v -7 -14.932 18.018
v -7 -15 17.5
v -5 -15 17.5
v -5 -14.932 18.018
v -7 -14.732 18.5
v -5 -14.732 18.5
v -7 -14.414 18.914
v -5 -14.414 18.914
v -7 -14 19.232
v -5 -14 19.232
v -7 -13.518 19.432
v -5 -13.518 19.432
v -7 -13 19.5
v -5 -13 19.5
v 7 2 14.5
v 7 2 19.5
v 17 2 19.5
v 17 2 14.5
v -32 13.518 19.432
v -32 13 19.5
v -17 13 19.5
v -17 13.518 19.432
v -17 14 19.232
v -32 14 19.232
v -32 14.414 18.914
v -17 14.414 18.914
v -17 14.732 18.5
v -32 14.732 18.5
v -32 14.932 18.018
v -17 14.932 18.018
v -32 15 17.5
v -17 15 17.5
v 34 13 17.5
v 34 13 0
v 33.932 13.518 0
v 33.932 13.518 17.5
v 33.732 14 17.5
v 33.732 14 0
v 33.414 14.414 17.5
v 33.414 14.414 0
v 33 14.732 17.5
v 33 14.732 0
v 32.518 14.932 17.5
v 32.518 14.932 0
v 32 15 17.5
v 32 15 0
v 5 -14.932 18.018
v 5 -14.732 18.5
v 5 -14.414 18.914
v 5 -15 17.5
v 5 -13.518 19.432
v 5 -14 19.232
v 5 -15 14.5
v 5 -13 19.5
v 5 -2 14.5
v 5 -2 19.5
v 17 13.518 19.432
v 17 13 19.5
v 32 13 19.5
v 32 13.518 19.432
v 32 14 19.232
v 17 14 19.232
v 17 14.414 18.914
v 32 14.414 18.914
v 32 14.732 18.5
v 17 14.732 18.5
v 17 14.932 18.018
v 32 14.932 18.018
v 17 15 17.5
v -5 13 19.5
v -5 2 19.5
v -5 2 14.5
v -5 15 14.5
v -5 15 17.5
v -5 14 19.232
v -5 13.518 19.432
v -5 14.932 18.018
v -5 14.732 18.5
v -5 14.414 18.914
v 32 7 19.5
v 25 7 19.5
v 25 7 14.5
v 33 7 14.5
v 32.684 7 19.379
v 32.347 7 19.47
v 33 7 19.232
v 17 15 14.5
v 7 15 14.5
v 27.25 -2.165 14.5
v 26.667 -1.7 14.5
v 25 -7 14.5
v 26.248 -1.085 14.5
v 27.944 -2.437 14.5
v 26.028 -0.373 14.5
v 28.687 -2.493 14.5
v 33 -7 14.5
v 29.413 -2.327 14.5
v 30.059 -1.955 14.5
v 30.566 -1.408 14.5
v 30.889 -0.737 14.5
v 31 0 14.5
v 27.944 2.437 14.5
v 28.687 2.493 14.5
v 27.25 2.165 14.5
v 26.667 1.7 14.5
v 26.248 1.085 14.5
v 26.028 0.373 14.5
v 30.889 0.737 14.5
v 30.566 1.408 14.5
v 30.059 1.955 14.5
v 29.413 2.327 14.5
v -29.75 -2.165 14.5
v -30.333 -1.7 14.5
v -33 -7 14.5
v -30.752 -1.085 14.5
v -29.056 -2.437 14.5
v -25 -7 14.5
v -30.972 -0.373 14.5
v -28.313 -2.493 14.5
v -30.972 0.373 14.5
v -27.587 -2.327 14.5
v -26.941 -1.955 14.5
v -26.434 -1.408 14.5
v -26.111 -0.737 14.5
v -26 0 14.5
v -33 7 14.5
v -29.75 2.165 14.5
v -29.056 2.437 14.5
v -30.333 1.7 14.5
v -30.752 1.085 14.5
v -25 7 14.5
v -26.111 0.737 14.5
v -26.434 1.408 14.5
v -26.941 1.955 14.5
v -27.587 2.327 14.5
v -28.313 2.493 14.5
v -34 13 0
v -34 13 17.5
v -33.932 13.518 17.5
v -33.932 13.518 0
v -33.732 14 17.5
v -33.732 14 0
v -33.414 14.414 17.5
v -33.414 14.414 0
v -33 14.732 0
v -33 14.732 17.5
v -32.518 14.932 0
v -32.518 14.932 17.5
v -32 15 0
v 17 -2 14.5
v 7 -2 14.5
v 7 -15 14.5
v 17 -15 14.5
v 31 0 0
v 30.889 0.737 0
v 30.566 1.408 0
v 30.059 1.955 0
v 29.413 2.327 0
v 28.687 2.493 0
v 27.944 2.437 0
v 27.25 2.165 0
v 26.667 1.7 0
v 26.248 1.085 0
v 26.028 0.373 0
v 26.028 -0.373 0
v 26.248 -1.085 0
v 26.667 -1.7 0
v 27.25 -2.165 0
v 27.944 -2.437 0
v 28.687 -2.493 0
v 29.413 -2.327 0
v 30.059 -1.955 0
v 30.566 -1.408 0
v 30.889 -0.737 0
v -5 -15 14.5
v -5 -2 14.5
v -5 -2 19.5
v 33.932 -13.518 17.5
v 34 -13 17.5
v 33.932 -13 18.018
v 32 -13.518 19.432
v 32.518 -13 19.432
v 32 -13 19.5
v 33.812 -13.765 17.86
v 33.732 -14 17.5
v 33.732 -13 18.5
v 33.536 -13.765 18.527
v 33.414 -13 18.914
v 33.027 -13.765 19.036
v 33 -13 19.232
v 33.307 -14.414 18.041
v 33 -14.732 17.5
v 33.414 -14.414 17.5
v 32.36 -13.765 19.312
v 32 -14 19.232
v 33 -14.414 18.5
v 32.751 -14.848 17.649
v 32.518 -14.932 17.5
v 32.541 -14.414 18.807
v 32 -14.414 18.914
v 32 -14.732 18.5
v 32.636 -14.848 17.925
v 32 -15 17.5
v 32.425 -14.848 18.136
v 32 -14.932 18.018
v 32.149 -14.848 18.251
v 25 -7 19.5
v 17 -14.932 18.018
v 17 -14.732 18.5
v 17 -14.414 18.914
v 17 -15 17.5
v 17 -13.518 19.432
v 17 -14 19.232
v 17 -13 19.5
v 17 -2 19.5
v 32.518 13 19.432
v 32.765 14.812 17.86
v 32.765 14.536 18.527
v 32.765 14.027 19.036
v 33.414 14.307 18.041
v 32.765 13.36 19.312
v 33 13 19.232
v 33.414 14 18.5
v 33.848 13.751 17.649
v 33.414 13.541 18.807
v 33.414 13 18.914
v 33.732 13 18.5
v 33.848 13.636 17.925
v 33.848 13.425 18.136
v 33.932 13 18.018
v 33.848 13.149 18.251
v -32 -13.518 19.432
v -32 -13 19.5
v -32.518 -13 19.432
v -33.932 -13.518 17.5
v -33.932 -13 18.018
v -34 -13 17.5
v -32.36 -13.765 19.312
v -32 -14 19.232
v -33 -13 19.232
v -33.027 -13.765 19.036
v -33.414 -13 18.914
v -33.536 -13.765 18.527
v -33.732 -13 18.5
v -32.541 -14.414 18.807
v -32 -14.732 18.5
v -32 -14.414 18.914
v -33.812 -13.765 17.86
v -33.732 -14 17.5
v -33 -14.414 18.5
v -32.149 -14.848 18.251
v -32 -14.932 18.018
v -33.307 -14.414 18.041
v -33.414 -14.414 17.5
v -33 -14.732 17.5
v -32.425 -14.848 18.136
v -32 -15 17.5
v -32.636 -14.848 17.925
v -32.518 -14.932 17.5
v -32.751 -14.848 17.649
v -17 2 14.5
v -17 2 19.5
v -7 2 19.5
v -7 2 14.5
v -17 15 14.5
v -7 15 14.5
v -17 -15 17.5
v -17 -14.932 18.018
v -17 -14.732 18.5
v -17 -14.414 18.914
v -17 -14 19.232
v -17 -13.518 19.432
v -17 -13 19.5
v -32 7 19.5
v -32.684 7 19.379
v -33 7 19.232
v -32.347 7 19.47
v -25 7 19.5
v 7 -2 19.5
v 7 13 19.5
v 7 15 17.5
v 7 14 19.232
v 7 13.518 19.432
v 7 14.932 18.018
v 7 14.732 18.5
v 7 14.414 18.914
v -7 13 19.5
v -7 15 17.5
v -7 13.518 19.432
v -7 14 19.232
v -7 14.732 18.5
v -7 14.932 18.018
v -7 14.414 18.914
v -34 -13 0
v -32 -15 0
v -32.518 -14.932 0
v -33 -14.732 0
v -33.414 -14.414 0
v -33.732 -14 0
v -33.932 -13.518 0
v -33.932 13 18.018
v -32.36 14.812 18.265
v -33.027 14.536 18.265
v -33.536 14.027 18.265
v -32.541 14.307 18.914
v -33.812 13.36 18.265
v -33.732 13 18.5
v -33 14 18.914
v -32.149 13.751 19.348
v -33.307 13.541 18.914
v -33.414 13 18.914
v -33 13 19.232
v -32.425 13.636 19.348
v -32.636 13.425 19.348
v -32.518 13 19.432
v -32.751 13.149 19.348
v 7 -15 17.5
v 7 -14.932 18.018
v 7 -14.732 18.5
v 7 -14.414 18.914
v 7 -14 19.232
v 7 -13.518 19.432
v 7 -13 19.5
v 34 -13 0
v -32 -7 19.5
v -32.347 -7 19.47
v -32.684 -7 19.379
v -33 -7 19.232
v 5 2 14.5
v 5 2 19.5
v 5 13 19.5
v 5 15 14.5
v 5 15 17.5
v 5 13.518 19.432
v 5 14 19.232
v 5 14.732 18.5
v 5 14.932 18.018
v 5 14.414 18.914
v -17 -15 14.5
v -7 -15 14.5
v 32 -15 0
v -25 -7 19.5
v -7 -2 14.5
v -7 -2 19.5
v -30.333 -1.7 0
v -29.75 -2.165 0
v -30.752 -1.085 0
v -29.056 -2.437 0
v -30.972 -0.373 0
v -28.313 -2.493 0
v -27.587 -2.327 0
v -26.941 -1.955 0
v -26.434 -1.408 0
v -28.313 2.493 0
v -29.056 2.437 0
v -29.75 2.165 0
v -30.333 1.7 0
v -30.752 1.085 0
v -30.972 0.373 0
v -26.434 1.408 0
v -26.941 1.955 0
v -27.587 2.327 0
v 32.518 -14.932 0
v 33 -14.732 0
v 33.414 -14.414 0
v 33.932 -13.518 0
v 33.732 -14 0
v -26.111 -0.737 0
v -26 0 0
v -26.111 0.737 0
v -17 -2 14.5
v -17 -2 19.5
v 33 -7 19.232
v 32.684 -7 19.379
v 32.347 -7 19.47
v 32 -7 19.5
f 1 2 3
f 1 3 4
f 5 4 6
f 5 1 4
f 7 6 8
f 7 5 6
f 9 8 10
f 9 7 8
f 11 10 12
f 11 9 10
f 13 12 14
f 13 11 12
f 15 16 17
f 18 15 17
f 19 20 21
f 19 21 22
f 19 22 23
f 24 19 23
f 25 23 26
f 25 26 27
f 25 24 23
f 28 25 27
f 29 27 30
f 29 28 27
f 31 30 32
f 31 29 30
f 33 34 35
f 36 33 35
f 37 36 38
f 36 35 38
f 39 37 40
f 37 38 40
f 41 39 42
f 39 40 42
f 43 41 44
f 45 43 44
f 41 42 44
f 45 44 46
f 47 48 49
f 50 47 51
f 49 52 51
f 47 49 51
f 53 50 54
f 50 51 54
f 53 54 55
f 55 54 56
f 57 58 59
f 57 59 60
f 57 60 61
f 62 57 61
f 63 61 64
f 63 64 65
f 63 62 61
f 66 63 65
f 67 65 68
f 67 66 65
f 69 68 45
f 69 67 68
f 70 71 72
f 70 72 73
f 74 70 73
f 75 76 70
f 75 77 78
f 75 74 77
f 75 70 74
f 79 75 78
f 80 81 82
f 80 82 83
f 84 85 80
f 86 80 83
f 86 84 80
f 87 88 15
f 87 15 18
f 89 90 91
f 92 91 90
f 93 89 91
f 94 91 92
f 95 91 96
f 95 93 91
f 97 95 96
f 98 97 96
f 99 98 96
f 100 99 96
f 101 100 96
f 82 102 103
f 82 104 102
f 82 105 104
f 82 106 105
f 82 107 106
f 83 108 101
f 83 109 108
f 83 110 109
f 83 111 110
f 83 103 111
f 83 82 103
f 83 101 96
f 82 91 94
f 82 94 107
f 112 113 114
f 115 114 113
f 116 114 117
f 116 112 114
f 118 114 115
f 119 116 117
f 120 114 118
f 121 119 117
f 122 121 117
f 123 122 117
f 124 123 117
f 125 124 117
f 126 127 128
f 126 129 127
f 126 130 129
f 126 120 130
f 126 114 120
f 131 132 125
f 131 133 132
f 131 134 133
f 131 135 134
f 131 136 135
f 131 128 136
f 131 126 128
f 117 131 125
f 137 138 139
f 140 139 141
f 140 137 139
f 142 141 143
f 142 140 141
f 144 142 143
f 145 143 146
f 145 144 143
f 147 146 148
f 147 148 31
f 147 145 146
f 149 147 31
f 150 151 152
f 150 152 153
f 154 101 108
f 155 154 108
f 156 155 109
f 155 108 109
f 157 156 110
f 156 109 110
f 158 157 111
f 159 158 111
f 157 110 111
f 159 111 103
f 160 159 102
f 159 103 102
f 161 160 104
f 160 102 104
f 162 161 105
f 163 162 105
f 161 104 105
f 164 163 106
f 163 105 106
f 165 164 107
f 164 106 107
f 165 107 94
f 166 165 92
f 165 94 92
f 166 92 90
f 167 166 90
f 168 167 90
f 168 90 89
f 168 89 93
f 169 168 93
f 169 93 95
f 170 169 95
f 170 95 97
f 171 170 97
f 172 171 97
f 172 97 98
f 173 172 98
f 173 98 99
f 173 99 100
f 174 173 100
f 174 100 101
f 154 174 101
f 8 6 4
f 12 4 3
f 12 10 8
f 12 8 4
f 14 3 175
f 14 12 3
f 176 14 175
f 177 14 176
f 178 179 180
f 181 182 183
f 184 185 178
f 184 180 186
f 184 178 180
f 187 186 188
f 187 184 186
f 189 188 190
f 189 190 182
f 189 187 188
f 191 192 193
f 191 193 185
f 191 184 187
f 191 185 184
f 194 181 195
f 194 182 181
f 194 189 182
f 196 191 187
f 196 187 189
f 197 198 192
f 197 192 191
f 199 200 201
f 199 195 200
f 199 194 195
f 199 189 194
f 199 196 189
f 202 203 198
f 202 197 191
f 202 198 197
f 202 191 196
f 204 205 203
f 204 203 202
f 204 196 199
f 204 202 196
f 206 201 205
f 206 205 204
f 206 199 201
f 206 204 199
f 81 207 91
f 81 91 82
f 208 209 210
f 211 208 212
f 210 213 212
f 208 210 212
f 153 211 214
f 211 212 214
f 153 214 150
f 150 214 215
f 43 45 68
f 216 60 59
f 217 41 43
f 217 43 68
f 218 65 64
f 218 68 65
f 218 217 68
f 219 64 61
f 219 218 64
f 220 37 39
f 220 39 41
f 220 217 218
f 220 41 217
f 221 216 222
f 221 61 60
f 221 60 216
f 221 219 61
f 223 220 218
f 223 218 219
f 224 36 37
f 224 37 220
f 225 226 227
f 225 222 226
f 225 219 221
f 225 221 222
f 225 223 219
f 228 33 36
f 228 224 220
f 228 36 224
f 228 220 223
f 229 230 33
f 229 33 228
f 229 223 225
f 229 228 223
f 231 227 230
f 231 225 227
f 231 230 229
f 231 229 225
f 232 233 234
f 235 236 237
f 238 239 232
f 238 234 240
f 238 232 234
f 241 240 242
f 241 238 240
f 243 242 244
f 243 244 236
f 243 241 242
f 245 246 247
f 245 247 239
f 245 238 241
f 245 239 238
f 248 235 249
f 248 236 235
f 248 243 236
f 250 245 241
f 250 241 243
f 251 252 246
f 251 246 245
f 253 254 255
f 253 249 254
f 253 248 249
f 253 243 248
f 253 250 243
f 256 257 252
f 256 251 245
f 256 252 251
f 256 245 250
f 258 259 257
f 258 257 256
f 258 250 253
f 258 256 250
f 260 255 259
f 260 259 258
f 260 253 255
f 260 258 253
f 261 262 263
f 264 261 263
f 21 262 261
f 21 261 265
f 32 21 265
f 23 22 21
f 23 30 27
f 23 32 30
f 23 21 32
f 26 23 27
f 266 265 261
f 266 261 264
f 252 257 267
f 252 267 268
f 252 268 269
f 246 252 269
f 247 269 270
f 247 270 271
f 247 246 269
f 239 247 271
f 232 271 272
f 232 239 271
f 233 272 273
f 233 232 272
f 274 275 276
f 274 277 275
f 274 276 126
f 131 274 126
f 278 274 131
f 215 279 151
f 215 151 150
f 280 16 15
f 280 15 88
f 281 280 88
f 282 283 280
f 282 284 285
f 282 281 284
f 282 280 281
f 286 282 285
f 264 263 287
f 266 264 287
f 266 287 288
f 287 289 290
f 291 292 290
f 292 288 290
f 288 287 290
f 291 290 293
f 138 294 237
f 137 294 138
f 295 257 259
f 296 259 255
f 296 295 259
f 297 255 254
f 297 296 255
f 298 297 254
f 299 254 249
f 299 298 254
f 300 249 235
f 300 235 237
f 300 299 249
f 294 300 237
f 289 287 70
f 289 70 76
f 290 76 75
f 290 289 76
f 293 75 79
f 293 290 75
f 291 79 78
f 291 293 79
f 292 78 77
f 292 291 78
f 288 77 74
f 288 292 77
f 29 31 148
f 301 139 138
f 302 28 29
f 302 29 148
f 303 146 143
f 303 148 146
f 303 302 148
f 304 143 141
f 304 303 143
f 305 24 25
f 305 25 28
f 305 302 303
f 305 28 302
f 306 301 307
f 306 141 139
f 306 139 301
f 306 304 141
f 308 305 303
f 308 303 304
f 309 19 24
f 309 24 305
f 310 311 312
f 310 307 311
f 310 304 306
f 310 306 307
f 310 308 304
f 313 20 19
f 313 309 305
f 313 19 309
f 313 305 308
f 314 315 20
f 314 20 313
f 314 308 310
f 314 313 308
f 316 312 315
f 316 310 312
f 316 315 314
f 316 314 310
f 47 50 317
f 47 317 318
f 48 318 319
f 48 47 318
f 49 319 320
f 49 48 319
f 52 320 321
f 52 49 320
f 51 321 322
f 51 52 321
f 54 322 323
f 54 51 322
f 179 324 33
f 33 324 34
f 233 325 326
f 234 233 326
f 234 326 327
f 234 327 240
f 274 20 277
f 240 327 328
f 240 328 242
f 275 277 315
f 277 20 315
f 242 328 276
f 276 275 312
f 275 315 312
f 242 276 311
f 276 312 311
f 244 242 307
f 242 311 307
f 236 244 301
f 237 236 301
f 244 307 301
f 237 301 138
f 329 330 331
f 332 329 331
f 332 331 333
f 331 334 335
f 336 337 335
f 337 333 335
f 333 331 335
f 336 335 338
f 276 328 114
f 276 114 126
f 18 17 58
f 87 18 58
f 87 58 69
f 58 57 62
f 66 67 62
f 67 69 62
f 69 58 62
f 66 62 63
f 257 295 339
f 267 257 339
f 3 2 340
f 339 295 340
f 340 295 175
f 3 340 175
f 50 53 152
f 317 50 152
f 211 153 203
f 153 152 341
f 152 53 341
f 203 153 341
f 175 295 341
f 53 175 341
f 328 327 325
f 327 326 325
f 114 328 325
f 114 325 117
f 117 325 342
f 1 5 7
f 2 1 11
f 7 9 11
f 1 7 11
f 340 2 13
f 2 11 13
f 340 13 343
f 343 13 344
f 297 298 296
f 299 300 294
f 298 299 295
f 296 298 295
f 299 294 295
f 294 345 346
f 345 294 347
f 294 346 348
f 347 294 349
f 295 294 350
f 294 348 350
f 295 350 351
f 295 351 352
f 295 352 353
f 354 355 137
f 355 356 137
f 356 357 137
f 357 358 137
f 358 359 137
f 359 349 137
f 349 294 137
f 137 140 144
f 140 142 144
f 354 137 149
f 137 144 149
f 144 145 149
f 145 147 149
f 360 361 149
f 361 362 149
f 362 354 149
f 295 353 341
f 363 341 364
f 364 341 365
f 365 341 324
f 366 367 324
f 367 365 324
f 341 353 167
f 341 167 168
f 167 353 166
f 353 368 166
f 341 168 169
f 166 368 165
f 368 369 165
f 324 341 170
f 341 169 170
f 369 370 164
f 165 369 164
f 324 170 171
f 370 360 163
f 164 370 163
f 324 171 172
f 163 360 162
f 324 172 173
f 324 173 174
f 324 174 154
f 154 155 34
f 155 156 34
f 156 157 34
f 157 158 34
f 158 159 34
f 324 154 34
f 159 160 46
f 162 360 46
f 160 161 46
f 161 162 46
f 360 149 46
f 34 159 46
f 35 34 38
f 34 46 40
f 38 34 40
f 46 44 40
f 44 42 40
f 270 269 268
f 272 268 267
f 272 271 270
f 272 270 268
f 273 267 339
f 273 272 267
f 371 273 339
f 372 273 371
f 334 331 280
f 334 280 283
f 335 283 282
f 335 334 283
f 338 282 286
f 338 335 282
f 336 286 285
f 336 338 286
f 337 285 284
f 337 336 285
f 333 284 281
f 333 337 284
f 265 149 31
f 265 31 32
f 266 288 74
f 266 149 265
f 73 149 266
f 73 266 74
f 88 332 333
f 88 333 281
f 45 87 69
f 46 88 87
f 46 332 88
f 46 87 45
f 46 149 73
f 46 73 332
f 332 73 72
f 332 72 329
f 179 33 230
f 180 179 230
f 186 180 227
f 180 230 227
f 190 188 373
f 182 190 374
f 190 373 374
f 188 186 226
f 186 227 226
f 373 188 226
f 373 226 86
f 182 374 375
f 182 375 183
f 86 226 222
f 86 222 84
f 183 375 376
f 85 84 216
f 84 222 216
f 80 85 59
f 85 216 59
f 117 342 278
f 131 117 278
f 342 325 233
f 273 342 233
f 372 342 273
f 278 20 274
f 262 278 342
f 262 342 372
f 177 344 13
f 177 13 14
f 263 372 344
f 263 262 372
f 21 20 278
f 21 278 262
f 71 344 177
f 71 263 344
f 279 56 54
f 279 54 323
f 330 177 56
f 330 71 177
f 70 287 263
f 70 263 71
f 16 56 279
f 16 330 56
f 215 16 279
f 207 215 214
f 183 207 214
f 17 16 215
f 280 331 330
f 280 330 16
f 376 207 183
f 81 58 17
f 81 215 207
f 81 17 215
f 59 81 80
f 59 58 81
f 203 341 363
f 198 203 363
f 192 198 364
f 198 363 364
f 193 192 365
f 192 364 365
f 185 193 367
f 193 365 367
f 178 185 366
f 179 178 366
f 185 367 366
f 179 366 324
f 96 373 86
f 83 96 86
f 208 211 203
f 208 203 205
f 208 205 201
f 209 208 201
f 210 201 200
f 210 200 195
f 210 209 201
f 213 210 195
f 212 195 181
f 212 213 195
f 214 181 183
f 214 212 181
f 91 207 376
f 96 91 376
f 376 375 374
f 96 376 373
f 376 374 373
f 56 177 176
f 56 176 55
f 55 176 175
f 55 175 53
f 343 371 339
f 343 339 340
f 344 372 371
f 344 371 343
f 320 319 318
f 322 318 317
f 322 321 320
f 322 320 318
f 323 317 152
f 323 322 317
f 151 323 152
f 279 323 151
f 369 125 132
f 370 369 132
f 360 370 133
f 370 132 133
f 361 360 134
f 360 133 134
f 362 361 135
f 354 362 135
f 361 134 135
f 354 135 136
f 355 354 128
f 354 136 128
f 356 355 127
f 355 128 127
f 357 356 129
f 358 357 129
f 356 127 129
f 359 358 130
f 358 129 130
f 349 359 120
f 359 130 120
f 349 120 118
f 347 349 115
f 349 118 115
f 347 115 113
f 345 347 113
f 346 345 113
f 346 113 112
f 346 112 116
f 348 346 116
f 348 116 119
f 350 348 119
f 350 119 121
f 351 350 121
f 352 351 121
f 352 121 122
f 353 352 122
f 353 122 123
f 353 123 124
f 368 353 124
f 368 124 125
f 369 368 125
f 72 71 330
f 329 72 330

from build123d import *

# Parameters (mm, degrees)
F0_W         = 68
F0_H         = 30
F1_DEPTH     = 19.5
F2_R         = 2.5
F3_DEPTH     = 19.5
F4_W         = 10
F4_H         = 13
F4_W_2       = 8
F4_H_2       = 14
F5_DEPTH     = 5
F6_T1_DEPTH  = 20
F6_T3_DEPTH  = 26
F6_T5_DEPTH  = 20
F6_T7_DEPTH  = 12
F6_T9_DEPTH  = 12
F6_T11_DEPTH = 22.5
F6_S15_W     = 2
F6_S15_H     = 2
F6_T16_DEPTH = 2
F6_S21_W     = 2
F6_S21_H     = 2
F6_T22_DEPTH = 2
F6_S27_W     = 2
F6_S27_H     = 2
F6_T28_DEPTH = 2
F6_S33_W     = 2
F6_S33_H     = 2
F6_T34_DEPTH = 2


# Not quite as in the source:
# - a fillet or chamfer that OpenCascade refuses, or shapes differently, is made with other operations: its cross-section is extruded or revolved along the edge and cut away or added


with BuildPart() as f1:
    # F0 (on Top) → F1 (new body)
    with BuildSketch(Plane.XY):
        Rectangle(F0_W, F0_H)
    extrude(amount=F1_DEPTH)

    # F2 (on face) → F3 (cut, through all)
    with BuildSketch(Plane.XY.offset(19.5)):
        with Locations((-28.5, 0)):
            Circle(F2_R)
        with Locations((28.5, 0)):
            Circle(F2_R)
    extrude(amount=-F3_DEPTH, mode=Mode.SUBTRACT)

    # F4 (on face) → F5 (cut)
    with BuildSketch(Plane.XY.offset(19.5)):
        with Locations((0, 8.5)):
            Rectangle(F4_W, F4_H)
        with Locations((12, 8.5)):
            Rectangle(F4_W, F4_H)
        with Locations((-12, 8.5)):
            Rectangle(F4_W, F4_H)
        with Locations((-12, -8.5)):
            Rectangle(F4_W, F4_H)
        with Locations((0, -8.5)):
            Rectangle(F4_W, F4_H)
        with Locations((12, -8.5)):
            Rectangle(F4_W, F4_H)
        with Locations((29, 0)):
            Rectangle(F4_W_2, F4_H_2)
        with Locations((-29, 0)):
            Rectangle(F4_W_2, F4_H_2)
    extrude(amount=-F5_DEPTH, mode=Mode.SUBTRACT)

    # F6: fillet of radius 2 on 14 edges, made by hand

    # F6_s2 → F6_t1 (cut)
    with BuildSketch(Plane.YZ.offset(-32)):
        with BuildLine():
            ThreePointArc((-15, 17.5), (-14.4142135624, 18.9142135624), (-13, 19.5))
            Line((-13, 19.5), (-15, 19.5))
            Line((-15, 19.5), (-15, 17.5))
        make_face()
        with BuildLine():
            ThreePointArc((13, 19.5), (14.4142135624, 18.9142135624), (15, 17.5))
            Line((15, 17.5), (15, 19.5))
            Line((15, 19.5), (13, 19.5))
        make_face()
    extrude(amount=F6_T1_DEPTH, mode=Mode.SUBTRACT)

    # F6_s4 → F6_t3 (cut)
    with BuildSketch(Plane.XZ.offset(-13)):
        with BuildLine():
            ThreePointArc((-32, 19.5), (-33.4142135624, 18.9142135624), (-34, 17.5))
            Line((-34, 17.5), (-34, 19.5))
            Line((-34, 19.5), (-32, 19.5))
        make_face()
        with BuildLine():
            ThreePointArc((34, 17.5), (33.4142135624, 18.9142135624), (32, 19.5))
            Line((32, 19.5), (34, 19.5))
            Line((34, 19.5), (34, 17.5))
        make_face()
    extrude(amount=F6_T3_DEPTH, mode=Mode.SUBTRACT)

    # F6_s6 → F6_t5 (cut)
    with BuildSketch(Plane.YZ.offset(12)):
        with BuildLine():
            ThreePointArc((-15, 17.5), (-14.4142135624, 18.9142135624), (-13, 19.5))
            Line((-13, 19.5), (-15, 19.5))
            Line((-15, 19.5), (-15, 17.5))
        make_face()
        with BuildLine():
            ThreePointArc((13, 19.5), (14.4142135624, 18.9142135624), (15, 17.5))
            Line((15, 17.5), (15, 19.5))
            Line((15, 19.5), (13, 19.5))
        make_face()
    extrude(amount=F6_T5_DEPTH, mode=Mode.SUBTRACT)

    # F6_s8 → F6_t7 (cut)
    with BuildSketch(Plane.YZ):
        with BuildLine():
            ThreePointArc((-15, 17.5), (-14.4142135624, 18.9142135624), (-13, 19.5))
            Line((-13, 19.5), (-15, 19.5))
            Line((-15, 19.5), (-15, 17.5))
        make_face()
        with BuildLine():
            ThreePointArc((13, 19.5), (14.4142135624, 18.9142135624), (15, 17.5))
            Line((15, 17.5), (15, 19.5))
            Line((15, 19.5), (13, 19.5))
        make_face()
    extrude(amount=F6_T7_DEPTH, mode=Mode.SUBTRACT)

    # F6_s10 → F6_t9 (cut)
    with BuildSketch(Plane.YZ.offset(-12)):
        with BuildLine():
            ThreePointArc((-15, 17.5), (-14.4142135624, 18.9142135624), (-13, 19.5))
            Line((-13, 19.5), (-15, 19.5))
            Line((-15, 19.5), (-15, 17.5))
        make_face()
        with BuildLine():
            ThreePointArc((13, 19.5), (14.4142135624, 18.9142135624), (15, 17.5))
            Line((15, 17.5), (15, 19.5))
            Line((15, 19.5), (13, 19.5))
        make_face()
    extrude(amount=F6_T9_DEPTH, mode=Mode.SUBTRACT)

    # F6_s12 → F6_t11 (cut)
    with BuildSketch(Plane.XY.offset(-5)):
        with BuildLine():
            ThreePointArc((-32, -15), (-33.4142135624, -14.4142135624), (-34, -13))
            Line((-34, -13), (-34, -15))
            Line((-34, -15), (-32, -15))
        make_face()
        with BuildLine():
            ThreePointArc((-34, 13), (-33.4142135624, 14.4142135624), (-32, 15))
            Line((-32, 15), (-34, 15))
            Line((-34, 15), (-34, 13))
        make_face()
        with BuildLine():
            ThreePointArc((34, 13), (33.4142135624, 14.4142135624), (32, 15))
            Line((32, 15), (34, 15))
            Line((34, 15), (34, 13))
        make_face()
        with BuildLine():
            ThreePointArc((32, -15), (33.4142135624, -14.4142135624), (34, -13))
            Line((34, -13), (34, -15))
            Line((34, -15), (32, -15))
        make_face()
    extrude(amount=F6_T11_DEPTH, mode=Mode.SUBTRACT)


with BuildPart() as f6_tool14:
    # F6_s15 → F6_t16 (new body)
    with BuildSketch(Plane.XZ.offset(13)):
        with Locations((-33, 18.5)):
            Rectangle(F6_S15_W, F6_S15_H)
    extrude(amount=F6_T16_DEPTH)

    # F6_s17 → F6_t18 (revolve, cut)
    with BuildSketch(Plane(origin=(-32, -13, 17.5), x_dir=(0.7071067812, 0, -0.7071067812), z_dir=(-0.7071067812, 0, -0.7071067812))):
        with BuildLine():
            ThreePointArc((0, -2), (2, 0), (0, 2))
            Line((0, 2), (0, -2))
        make_face()
    revolve(axis=Axis((-32, -13, 17.5), (0, -1, 0)), mode=Mode.SUBTRACT)


with BuildPart() as f1_1:
    add(f1.part)

    # F6_t13: cut F6_tool14
    add(f6_tool14.part, mode=Mode.SUBTRACT)


with BuildPart() as f6_tool20:
    # F6_s21 → F6_t22 (new body)
    with BuildSketch(Plane.XY.offset(17.5)):
        with Locations((-33, 14)):
            Rectangle(F6_S21_W, F6_S21_H)
    extrude(amount=F6_T22_DEPTH)

    # F6_s23 → F6_t24 (revolve, cut)
    with BuildSketch(Plane(origin=(-32, 13, 17.5), x_dir=(0.7071067812, -0.7071067812, 0), z_dir=(-0.7071067812, -0.7071067812, 0))):
        with BuildLine():
            ThreePointArc((0, -2), (2, 0), (0, 2))
            Line((0, 2), (0, -2))
        make_face()
    revolve(axis=Axis((-32, 13, 17.5), (0, 0, 1)), mode=Mode.SUBTRACT)


with BuildPart() as f1_2:
    add(f1_1.part)

    # F6_t19: cut F6_tool20
    add(f6_tool20.part, mode=Mode.SUBTRACT)


with BuildPart() as f6_tool26:
    # F6_s27 → F6_t28 (new body)
    with BuildSketch(Plane.XZ.offset(13)):
        with Locations((33, 18.5)):
            Rectangle(F6_S27_W, F6_S27_H)
    extrude(amount=F6_T28_DEPTH)

    # F6_s29 → F6_t30 (revolve, cut)
    with BuildSketch(Plane(origin=(32, -13, 17.5), x_dir=(-0.7071067812, 0, -0.7071067812), z_dir=(-0.7071067812, 0, 0.7071067812))):
        with BuildLine():
            ThreePointArc((0, -2), (2, 0), (0, 2))
            Line((0, 2), (0, -2))
        make_face()
    revolve(axis=Axis((32, -13, 17.5), (0, -1, 0)), mode=Mode.SUBTRACT)


with BuildPart() as f1_3:
    add(f1_2.part)

    # F6_t25: cut F6_tool26
    add(f6_tool26.part, mode=Mode.SUBTRACT)


with BuildPart() as f6_tool32:
    # F6_s33 → F6_t34 (new body)
    with BuildSketch(Plane.YZ.offset(32)):
        with Locations((14, 18.5)):
            Rectangle(F6_S33_W, F6_S33_H)
    extrude(amount=F6_T34_DEPTH)

    # F6_s35 → F6_t36 (revolve, cut)
    with BuildSketch(Plane(origin=(32, 13, 17.5), x_dir=(0, -0.7071067812, -0.7071067812), z_dir=(0, -0.7071067812, 0.7071067812))):
        with BuildLine():
            ThreePointArc((0, -2), (2, 0), (0, 2))
            Line((0, 2), (0, -2))
        make_face()
    revolve(axis=Axis((32, 13, 17.5), (1, 0, 0)), mode=Mode.SUBTRACT)


with BuildPart() as f1_4:
    add(f1_3.part)

    # F6_t31: cut F6_tool32
    add(f6_tool32.part, mode=Mode.SUBTRACT)


solid = f1_4.part
